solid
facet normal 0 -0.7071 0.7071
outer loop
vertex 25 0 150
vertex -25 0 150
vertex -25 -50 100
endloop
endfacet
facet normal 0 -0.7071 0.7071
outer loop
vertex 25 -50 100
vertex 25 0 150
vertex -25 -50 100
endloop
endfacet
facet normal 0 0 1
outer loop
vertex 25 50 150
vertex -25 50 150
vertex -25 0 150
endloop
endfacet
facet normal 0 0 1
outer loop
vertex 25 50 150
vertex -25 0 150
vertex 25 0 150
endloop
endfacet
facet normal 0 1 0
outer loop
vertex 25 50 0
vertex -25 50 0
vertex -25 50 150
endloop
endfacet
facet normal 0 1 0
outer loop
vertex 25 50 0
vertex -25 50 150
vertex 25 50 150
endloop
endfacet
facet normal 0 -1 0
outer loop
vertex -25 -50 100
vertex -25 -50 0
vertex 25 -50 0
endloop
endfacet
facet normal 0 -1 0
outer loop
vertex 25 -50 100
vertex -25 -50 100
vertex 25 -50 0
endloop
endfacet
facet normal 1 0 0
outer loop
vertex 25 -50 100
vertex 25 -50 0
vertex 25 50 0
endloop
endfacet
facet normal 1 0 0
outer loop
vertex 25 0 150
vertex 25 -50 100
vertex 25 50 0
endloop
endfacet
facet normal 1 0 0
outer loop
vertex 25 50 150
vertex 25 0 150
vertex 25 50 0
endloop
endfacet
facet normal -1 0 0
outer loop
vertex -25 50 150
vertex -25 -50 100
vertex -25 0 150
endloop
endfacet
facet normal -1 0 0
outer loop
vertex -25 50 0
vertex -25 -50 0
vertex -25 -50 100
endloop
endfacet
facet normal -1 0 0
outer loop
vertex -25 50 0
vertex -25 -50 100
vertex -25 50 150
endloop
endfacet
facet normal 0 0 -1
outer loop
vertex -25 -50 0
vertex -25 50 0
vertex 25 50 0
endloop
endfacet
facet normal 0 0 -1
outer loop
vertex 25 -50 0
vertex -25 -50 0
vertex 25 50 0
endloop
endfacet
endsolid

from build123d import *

# Parameters (mm, degrees)
SKETCH2_W           = 50
SKETCH2_H           = 100
BOSS_EXTRUDE1_DEPTH = 150
CUT_EXTRUDE1_DEPTH  = 150


with BuildPart() as part:
    # Sketch2 → Boss-Extrude1 (new body)
    with BuildSketch(Plane.XY):
        Rectangle(SKETCH2_W, SKETCH2_H)
    extrude(amount=BOSS_EXTRUDE1_DEPTH)

    # Sketch3 → Cut-Extrude1 (cut)
    with BuildSketch(Plane.ZY.offset(25)):
        Polygon((150, 0), (100, -50), (150, -50), align=None)
    extrude(amount=-CUT_EXTRUDE1_DEPTH, mode=Mode.SUBTRACT)


solid = part.part
